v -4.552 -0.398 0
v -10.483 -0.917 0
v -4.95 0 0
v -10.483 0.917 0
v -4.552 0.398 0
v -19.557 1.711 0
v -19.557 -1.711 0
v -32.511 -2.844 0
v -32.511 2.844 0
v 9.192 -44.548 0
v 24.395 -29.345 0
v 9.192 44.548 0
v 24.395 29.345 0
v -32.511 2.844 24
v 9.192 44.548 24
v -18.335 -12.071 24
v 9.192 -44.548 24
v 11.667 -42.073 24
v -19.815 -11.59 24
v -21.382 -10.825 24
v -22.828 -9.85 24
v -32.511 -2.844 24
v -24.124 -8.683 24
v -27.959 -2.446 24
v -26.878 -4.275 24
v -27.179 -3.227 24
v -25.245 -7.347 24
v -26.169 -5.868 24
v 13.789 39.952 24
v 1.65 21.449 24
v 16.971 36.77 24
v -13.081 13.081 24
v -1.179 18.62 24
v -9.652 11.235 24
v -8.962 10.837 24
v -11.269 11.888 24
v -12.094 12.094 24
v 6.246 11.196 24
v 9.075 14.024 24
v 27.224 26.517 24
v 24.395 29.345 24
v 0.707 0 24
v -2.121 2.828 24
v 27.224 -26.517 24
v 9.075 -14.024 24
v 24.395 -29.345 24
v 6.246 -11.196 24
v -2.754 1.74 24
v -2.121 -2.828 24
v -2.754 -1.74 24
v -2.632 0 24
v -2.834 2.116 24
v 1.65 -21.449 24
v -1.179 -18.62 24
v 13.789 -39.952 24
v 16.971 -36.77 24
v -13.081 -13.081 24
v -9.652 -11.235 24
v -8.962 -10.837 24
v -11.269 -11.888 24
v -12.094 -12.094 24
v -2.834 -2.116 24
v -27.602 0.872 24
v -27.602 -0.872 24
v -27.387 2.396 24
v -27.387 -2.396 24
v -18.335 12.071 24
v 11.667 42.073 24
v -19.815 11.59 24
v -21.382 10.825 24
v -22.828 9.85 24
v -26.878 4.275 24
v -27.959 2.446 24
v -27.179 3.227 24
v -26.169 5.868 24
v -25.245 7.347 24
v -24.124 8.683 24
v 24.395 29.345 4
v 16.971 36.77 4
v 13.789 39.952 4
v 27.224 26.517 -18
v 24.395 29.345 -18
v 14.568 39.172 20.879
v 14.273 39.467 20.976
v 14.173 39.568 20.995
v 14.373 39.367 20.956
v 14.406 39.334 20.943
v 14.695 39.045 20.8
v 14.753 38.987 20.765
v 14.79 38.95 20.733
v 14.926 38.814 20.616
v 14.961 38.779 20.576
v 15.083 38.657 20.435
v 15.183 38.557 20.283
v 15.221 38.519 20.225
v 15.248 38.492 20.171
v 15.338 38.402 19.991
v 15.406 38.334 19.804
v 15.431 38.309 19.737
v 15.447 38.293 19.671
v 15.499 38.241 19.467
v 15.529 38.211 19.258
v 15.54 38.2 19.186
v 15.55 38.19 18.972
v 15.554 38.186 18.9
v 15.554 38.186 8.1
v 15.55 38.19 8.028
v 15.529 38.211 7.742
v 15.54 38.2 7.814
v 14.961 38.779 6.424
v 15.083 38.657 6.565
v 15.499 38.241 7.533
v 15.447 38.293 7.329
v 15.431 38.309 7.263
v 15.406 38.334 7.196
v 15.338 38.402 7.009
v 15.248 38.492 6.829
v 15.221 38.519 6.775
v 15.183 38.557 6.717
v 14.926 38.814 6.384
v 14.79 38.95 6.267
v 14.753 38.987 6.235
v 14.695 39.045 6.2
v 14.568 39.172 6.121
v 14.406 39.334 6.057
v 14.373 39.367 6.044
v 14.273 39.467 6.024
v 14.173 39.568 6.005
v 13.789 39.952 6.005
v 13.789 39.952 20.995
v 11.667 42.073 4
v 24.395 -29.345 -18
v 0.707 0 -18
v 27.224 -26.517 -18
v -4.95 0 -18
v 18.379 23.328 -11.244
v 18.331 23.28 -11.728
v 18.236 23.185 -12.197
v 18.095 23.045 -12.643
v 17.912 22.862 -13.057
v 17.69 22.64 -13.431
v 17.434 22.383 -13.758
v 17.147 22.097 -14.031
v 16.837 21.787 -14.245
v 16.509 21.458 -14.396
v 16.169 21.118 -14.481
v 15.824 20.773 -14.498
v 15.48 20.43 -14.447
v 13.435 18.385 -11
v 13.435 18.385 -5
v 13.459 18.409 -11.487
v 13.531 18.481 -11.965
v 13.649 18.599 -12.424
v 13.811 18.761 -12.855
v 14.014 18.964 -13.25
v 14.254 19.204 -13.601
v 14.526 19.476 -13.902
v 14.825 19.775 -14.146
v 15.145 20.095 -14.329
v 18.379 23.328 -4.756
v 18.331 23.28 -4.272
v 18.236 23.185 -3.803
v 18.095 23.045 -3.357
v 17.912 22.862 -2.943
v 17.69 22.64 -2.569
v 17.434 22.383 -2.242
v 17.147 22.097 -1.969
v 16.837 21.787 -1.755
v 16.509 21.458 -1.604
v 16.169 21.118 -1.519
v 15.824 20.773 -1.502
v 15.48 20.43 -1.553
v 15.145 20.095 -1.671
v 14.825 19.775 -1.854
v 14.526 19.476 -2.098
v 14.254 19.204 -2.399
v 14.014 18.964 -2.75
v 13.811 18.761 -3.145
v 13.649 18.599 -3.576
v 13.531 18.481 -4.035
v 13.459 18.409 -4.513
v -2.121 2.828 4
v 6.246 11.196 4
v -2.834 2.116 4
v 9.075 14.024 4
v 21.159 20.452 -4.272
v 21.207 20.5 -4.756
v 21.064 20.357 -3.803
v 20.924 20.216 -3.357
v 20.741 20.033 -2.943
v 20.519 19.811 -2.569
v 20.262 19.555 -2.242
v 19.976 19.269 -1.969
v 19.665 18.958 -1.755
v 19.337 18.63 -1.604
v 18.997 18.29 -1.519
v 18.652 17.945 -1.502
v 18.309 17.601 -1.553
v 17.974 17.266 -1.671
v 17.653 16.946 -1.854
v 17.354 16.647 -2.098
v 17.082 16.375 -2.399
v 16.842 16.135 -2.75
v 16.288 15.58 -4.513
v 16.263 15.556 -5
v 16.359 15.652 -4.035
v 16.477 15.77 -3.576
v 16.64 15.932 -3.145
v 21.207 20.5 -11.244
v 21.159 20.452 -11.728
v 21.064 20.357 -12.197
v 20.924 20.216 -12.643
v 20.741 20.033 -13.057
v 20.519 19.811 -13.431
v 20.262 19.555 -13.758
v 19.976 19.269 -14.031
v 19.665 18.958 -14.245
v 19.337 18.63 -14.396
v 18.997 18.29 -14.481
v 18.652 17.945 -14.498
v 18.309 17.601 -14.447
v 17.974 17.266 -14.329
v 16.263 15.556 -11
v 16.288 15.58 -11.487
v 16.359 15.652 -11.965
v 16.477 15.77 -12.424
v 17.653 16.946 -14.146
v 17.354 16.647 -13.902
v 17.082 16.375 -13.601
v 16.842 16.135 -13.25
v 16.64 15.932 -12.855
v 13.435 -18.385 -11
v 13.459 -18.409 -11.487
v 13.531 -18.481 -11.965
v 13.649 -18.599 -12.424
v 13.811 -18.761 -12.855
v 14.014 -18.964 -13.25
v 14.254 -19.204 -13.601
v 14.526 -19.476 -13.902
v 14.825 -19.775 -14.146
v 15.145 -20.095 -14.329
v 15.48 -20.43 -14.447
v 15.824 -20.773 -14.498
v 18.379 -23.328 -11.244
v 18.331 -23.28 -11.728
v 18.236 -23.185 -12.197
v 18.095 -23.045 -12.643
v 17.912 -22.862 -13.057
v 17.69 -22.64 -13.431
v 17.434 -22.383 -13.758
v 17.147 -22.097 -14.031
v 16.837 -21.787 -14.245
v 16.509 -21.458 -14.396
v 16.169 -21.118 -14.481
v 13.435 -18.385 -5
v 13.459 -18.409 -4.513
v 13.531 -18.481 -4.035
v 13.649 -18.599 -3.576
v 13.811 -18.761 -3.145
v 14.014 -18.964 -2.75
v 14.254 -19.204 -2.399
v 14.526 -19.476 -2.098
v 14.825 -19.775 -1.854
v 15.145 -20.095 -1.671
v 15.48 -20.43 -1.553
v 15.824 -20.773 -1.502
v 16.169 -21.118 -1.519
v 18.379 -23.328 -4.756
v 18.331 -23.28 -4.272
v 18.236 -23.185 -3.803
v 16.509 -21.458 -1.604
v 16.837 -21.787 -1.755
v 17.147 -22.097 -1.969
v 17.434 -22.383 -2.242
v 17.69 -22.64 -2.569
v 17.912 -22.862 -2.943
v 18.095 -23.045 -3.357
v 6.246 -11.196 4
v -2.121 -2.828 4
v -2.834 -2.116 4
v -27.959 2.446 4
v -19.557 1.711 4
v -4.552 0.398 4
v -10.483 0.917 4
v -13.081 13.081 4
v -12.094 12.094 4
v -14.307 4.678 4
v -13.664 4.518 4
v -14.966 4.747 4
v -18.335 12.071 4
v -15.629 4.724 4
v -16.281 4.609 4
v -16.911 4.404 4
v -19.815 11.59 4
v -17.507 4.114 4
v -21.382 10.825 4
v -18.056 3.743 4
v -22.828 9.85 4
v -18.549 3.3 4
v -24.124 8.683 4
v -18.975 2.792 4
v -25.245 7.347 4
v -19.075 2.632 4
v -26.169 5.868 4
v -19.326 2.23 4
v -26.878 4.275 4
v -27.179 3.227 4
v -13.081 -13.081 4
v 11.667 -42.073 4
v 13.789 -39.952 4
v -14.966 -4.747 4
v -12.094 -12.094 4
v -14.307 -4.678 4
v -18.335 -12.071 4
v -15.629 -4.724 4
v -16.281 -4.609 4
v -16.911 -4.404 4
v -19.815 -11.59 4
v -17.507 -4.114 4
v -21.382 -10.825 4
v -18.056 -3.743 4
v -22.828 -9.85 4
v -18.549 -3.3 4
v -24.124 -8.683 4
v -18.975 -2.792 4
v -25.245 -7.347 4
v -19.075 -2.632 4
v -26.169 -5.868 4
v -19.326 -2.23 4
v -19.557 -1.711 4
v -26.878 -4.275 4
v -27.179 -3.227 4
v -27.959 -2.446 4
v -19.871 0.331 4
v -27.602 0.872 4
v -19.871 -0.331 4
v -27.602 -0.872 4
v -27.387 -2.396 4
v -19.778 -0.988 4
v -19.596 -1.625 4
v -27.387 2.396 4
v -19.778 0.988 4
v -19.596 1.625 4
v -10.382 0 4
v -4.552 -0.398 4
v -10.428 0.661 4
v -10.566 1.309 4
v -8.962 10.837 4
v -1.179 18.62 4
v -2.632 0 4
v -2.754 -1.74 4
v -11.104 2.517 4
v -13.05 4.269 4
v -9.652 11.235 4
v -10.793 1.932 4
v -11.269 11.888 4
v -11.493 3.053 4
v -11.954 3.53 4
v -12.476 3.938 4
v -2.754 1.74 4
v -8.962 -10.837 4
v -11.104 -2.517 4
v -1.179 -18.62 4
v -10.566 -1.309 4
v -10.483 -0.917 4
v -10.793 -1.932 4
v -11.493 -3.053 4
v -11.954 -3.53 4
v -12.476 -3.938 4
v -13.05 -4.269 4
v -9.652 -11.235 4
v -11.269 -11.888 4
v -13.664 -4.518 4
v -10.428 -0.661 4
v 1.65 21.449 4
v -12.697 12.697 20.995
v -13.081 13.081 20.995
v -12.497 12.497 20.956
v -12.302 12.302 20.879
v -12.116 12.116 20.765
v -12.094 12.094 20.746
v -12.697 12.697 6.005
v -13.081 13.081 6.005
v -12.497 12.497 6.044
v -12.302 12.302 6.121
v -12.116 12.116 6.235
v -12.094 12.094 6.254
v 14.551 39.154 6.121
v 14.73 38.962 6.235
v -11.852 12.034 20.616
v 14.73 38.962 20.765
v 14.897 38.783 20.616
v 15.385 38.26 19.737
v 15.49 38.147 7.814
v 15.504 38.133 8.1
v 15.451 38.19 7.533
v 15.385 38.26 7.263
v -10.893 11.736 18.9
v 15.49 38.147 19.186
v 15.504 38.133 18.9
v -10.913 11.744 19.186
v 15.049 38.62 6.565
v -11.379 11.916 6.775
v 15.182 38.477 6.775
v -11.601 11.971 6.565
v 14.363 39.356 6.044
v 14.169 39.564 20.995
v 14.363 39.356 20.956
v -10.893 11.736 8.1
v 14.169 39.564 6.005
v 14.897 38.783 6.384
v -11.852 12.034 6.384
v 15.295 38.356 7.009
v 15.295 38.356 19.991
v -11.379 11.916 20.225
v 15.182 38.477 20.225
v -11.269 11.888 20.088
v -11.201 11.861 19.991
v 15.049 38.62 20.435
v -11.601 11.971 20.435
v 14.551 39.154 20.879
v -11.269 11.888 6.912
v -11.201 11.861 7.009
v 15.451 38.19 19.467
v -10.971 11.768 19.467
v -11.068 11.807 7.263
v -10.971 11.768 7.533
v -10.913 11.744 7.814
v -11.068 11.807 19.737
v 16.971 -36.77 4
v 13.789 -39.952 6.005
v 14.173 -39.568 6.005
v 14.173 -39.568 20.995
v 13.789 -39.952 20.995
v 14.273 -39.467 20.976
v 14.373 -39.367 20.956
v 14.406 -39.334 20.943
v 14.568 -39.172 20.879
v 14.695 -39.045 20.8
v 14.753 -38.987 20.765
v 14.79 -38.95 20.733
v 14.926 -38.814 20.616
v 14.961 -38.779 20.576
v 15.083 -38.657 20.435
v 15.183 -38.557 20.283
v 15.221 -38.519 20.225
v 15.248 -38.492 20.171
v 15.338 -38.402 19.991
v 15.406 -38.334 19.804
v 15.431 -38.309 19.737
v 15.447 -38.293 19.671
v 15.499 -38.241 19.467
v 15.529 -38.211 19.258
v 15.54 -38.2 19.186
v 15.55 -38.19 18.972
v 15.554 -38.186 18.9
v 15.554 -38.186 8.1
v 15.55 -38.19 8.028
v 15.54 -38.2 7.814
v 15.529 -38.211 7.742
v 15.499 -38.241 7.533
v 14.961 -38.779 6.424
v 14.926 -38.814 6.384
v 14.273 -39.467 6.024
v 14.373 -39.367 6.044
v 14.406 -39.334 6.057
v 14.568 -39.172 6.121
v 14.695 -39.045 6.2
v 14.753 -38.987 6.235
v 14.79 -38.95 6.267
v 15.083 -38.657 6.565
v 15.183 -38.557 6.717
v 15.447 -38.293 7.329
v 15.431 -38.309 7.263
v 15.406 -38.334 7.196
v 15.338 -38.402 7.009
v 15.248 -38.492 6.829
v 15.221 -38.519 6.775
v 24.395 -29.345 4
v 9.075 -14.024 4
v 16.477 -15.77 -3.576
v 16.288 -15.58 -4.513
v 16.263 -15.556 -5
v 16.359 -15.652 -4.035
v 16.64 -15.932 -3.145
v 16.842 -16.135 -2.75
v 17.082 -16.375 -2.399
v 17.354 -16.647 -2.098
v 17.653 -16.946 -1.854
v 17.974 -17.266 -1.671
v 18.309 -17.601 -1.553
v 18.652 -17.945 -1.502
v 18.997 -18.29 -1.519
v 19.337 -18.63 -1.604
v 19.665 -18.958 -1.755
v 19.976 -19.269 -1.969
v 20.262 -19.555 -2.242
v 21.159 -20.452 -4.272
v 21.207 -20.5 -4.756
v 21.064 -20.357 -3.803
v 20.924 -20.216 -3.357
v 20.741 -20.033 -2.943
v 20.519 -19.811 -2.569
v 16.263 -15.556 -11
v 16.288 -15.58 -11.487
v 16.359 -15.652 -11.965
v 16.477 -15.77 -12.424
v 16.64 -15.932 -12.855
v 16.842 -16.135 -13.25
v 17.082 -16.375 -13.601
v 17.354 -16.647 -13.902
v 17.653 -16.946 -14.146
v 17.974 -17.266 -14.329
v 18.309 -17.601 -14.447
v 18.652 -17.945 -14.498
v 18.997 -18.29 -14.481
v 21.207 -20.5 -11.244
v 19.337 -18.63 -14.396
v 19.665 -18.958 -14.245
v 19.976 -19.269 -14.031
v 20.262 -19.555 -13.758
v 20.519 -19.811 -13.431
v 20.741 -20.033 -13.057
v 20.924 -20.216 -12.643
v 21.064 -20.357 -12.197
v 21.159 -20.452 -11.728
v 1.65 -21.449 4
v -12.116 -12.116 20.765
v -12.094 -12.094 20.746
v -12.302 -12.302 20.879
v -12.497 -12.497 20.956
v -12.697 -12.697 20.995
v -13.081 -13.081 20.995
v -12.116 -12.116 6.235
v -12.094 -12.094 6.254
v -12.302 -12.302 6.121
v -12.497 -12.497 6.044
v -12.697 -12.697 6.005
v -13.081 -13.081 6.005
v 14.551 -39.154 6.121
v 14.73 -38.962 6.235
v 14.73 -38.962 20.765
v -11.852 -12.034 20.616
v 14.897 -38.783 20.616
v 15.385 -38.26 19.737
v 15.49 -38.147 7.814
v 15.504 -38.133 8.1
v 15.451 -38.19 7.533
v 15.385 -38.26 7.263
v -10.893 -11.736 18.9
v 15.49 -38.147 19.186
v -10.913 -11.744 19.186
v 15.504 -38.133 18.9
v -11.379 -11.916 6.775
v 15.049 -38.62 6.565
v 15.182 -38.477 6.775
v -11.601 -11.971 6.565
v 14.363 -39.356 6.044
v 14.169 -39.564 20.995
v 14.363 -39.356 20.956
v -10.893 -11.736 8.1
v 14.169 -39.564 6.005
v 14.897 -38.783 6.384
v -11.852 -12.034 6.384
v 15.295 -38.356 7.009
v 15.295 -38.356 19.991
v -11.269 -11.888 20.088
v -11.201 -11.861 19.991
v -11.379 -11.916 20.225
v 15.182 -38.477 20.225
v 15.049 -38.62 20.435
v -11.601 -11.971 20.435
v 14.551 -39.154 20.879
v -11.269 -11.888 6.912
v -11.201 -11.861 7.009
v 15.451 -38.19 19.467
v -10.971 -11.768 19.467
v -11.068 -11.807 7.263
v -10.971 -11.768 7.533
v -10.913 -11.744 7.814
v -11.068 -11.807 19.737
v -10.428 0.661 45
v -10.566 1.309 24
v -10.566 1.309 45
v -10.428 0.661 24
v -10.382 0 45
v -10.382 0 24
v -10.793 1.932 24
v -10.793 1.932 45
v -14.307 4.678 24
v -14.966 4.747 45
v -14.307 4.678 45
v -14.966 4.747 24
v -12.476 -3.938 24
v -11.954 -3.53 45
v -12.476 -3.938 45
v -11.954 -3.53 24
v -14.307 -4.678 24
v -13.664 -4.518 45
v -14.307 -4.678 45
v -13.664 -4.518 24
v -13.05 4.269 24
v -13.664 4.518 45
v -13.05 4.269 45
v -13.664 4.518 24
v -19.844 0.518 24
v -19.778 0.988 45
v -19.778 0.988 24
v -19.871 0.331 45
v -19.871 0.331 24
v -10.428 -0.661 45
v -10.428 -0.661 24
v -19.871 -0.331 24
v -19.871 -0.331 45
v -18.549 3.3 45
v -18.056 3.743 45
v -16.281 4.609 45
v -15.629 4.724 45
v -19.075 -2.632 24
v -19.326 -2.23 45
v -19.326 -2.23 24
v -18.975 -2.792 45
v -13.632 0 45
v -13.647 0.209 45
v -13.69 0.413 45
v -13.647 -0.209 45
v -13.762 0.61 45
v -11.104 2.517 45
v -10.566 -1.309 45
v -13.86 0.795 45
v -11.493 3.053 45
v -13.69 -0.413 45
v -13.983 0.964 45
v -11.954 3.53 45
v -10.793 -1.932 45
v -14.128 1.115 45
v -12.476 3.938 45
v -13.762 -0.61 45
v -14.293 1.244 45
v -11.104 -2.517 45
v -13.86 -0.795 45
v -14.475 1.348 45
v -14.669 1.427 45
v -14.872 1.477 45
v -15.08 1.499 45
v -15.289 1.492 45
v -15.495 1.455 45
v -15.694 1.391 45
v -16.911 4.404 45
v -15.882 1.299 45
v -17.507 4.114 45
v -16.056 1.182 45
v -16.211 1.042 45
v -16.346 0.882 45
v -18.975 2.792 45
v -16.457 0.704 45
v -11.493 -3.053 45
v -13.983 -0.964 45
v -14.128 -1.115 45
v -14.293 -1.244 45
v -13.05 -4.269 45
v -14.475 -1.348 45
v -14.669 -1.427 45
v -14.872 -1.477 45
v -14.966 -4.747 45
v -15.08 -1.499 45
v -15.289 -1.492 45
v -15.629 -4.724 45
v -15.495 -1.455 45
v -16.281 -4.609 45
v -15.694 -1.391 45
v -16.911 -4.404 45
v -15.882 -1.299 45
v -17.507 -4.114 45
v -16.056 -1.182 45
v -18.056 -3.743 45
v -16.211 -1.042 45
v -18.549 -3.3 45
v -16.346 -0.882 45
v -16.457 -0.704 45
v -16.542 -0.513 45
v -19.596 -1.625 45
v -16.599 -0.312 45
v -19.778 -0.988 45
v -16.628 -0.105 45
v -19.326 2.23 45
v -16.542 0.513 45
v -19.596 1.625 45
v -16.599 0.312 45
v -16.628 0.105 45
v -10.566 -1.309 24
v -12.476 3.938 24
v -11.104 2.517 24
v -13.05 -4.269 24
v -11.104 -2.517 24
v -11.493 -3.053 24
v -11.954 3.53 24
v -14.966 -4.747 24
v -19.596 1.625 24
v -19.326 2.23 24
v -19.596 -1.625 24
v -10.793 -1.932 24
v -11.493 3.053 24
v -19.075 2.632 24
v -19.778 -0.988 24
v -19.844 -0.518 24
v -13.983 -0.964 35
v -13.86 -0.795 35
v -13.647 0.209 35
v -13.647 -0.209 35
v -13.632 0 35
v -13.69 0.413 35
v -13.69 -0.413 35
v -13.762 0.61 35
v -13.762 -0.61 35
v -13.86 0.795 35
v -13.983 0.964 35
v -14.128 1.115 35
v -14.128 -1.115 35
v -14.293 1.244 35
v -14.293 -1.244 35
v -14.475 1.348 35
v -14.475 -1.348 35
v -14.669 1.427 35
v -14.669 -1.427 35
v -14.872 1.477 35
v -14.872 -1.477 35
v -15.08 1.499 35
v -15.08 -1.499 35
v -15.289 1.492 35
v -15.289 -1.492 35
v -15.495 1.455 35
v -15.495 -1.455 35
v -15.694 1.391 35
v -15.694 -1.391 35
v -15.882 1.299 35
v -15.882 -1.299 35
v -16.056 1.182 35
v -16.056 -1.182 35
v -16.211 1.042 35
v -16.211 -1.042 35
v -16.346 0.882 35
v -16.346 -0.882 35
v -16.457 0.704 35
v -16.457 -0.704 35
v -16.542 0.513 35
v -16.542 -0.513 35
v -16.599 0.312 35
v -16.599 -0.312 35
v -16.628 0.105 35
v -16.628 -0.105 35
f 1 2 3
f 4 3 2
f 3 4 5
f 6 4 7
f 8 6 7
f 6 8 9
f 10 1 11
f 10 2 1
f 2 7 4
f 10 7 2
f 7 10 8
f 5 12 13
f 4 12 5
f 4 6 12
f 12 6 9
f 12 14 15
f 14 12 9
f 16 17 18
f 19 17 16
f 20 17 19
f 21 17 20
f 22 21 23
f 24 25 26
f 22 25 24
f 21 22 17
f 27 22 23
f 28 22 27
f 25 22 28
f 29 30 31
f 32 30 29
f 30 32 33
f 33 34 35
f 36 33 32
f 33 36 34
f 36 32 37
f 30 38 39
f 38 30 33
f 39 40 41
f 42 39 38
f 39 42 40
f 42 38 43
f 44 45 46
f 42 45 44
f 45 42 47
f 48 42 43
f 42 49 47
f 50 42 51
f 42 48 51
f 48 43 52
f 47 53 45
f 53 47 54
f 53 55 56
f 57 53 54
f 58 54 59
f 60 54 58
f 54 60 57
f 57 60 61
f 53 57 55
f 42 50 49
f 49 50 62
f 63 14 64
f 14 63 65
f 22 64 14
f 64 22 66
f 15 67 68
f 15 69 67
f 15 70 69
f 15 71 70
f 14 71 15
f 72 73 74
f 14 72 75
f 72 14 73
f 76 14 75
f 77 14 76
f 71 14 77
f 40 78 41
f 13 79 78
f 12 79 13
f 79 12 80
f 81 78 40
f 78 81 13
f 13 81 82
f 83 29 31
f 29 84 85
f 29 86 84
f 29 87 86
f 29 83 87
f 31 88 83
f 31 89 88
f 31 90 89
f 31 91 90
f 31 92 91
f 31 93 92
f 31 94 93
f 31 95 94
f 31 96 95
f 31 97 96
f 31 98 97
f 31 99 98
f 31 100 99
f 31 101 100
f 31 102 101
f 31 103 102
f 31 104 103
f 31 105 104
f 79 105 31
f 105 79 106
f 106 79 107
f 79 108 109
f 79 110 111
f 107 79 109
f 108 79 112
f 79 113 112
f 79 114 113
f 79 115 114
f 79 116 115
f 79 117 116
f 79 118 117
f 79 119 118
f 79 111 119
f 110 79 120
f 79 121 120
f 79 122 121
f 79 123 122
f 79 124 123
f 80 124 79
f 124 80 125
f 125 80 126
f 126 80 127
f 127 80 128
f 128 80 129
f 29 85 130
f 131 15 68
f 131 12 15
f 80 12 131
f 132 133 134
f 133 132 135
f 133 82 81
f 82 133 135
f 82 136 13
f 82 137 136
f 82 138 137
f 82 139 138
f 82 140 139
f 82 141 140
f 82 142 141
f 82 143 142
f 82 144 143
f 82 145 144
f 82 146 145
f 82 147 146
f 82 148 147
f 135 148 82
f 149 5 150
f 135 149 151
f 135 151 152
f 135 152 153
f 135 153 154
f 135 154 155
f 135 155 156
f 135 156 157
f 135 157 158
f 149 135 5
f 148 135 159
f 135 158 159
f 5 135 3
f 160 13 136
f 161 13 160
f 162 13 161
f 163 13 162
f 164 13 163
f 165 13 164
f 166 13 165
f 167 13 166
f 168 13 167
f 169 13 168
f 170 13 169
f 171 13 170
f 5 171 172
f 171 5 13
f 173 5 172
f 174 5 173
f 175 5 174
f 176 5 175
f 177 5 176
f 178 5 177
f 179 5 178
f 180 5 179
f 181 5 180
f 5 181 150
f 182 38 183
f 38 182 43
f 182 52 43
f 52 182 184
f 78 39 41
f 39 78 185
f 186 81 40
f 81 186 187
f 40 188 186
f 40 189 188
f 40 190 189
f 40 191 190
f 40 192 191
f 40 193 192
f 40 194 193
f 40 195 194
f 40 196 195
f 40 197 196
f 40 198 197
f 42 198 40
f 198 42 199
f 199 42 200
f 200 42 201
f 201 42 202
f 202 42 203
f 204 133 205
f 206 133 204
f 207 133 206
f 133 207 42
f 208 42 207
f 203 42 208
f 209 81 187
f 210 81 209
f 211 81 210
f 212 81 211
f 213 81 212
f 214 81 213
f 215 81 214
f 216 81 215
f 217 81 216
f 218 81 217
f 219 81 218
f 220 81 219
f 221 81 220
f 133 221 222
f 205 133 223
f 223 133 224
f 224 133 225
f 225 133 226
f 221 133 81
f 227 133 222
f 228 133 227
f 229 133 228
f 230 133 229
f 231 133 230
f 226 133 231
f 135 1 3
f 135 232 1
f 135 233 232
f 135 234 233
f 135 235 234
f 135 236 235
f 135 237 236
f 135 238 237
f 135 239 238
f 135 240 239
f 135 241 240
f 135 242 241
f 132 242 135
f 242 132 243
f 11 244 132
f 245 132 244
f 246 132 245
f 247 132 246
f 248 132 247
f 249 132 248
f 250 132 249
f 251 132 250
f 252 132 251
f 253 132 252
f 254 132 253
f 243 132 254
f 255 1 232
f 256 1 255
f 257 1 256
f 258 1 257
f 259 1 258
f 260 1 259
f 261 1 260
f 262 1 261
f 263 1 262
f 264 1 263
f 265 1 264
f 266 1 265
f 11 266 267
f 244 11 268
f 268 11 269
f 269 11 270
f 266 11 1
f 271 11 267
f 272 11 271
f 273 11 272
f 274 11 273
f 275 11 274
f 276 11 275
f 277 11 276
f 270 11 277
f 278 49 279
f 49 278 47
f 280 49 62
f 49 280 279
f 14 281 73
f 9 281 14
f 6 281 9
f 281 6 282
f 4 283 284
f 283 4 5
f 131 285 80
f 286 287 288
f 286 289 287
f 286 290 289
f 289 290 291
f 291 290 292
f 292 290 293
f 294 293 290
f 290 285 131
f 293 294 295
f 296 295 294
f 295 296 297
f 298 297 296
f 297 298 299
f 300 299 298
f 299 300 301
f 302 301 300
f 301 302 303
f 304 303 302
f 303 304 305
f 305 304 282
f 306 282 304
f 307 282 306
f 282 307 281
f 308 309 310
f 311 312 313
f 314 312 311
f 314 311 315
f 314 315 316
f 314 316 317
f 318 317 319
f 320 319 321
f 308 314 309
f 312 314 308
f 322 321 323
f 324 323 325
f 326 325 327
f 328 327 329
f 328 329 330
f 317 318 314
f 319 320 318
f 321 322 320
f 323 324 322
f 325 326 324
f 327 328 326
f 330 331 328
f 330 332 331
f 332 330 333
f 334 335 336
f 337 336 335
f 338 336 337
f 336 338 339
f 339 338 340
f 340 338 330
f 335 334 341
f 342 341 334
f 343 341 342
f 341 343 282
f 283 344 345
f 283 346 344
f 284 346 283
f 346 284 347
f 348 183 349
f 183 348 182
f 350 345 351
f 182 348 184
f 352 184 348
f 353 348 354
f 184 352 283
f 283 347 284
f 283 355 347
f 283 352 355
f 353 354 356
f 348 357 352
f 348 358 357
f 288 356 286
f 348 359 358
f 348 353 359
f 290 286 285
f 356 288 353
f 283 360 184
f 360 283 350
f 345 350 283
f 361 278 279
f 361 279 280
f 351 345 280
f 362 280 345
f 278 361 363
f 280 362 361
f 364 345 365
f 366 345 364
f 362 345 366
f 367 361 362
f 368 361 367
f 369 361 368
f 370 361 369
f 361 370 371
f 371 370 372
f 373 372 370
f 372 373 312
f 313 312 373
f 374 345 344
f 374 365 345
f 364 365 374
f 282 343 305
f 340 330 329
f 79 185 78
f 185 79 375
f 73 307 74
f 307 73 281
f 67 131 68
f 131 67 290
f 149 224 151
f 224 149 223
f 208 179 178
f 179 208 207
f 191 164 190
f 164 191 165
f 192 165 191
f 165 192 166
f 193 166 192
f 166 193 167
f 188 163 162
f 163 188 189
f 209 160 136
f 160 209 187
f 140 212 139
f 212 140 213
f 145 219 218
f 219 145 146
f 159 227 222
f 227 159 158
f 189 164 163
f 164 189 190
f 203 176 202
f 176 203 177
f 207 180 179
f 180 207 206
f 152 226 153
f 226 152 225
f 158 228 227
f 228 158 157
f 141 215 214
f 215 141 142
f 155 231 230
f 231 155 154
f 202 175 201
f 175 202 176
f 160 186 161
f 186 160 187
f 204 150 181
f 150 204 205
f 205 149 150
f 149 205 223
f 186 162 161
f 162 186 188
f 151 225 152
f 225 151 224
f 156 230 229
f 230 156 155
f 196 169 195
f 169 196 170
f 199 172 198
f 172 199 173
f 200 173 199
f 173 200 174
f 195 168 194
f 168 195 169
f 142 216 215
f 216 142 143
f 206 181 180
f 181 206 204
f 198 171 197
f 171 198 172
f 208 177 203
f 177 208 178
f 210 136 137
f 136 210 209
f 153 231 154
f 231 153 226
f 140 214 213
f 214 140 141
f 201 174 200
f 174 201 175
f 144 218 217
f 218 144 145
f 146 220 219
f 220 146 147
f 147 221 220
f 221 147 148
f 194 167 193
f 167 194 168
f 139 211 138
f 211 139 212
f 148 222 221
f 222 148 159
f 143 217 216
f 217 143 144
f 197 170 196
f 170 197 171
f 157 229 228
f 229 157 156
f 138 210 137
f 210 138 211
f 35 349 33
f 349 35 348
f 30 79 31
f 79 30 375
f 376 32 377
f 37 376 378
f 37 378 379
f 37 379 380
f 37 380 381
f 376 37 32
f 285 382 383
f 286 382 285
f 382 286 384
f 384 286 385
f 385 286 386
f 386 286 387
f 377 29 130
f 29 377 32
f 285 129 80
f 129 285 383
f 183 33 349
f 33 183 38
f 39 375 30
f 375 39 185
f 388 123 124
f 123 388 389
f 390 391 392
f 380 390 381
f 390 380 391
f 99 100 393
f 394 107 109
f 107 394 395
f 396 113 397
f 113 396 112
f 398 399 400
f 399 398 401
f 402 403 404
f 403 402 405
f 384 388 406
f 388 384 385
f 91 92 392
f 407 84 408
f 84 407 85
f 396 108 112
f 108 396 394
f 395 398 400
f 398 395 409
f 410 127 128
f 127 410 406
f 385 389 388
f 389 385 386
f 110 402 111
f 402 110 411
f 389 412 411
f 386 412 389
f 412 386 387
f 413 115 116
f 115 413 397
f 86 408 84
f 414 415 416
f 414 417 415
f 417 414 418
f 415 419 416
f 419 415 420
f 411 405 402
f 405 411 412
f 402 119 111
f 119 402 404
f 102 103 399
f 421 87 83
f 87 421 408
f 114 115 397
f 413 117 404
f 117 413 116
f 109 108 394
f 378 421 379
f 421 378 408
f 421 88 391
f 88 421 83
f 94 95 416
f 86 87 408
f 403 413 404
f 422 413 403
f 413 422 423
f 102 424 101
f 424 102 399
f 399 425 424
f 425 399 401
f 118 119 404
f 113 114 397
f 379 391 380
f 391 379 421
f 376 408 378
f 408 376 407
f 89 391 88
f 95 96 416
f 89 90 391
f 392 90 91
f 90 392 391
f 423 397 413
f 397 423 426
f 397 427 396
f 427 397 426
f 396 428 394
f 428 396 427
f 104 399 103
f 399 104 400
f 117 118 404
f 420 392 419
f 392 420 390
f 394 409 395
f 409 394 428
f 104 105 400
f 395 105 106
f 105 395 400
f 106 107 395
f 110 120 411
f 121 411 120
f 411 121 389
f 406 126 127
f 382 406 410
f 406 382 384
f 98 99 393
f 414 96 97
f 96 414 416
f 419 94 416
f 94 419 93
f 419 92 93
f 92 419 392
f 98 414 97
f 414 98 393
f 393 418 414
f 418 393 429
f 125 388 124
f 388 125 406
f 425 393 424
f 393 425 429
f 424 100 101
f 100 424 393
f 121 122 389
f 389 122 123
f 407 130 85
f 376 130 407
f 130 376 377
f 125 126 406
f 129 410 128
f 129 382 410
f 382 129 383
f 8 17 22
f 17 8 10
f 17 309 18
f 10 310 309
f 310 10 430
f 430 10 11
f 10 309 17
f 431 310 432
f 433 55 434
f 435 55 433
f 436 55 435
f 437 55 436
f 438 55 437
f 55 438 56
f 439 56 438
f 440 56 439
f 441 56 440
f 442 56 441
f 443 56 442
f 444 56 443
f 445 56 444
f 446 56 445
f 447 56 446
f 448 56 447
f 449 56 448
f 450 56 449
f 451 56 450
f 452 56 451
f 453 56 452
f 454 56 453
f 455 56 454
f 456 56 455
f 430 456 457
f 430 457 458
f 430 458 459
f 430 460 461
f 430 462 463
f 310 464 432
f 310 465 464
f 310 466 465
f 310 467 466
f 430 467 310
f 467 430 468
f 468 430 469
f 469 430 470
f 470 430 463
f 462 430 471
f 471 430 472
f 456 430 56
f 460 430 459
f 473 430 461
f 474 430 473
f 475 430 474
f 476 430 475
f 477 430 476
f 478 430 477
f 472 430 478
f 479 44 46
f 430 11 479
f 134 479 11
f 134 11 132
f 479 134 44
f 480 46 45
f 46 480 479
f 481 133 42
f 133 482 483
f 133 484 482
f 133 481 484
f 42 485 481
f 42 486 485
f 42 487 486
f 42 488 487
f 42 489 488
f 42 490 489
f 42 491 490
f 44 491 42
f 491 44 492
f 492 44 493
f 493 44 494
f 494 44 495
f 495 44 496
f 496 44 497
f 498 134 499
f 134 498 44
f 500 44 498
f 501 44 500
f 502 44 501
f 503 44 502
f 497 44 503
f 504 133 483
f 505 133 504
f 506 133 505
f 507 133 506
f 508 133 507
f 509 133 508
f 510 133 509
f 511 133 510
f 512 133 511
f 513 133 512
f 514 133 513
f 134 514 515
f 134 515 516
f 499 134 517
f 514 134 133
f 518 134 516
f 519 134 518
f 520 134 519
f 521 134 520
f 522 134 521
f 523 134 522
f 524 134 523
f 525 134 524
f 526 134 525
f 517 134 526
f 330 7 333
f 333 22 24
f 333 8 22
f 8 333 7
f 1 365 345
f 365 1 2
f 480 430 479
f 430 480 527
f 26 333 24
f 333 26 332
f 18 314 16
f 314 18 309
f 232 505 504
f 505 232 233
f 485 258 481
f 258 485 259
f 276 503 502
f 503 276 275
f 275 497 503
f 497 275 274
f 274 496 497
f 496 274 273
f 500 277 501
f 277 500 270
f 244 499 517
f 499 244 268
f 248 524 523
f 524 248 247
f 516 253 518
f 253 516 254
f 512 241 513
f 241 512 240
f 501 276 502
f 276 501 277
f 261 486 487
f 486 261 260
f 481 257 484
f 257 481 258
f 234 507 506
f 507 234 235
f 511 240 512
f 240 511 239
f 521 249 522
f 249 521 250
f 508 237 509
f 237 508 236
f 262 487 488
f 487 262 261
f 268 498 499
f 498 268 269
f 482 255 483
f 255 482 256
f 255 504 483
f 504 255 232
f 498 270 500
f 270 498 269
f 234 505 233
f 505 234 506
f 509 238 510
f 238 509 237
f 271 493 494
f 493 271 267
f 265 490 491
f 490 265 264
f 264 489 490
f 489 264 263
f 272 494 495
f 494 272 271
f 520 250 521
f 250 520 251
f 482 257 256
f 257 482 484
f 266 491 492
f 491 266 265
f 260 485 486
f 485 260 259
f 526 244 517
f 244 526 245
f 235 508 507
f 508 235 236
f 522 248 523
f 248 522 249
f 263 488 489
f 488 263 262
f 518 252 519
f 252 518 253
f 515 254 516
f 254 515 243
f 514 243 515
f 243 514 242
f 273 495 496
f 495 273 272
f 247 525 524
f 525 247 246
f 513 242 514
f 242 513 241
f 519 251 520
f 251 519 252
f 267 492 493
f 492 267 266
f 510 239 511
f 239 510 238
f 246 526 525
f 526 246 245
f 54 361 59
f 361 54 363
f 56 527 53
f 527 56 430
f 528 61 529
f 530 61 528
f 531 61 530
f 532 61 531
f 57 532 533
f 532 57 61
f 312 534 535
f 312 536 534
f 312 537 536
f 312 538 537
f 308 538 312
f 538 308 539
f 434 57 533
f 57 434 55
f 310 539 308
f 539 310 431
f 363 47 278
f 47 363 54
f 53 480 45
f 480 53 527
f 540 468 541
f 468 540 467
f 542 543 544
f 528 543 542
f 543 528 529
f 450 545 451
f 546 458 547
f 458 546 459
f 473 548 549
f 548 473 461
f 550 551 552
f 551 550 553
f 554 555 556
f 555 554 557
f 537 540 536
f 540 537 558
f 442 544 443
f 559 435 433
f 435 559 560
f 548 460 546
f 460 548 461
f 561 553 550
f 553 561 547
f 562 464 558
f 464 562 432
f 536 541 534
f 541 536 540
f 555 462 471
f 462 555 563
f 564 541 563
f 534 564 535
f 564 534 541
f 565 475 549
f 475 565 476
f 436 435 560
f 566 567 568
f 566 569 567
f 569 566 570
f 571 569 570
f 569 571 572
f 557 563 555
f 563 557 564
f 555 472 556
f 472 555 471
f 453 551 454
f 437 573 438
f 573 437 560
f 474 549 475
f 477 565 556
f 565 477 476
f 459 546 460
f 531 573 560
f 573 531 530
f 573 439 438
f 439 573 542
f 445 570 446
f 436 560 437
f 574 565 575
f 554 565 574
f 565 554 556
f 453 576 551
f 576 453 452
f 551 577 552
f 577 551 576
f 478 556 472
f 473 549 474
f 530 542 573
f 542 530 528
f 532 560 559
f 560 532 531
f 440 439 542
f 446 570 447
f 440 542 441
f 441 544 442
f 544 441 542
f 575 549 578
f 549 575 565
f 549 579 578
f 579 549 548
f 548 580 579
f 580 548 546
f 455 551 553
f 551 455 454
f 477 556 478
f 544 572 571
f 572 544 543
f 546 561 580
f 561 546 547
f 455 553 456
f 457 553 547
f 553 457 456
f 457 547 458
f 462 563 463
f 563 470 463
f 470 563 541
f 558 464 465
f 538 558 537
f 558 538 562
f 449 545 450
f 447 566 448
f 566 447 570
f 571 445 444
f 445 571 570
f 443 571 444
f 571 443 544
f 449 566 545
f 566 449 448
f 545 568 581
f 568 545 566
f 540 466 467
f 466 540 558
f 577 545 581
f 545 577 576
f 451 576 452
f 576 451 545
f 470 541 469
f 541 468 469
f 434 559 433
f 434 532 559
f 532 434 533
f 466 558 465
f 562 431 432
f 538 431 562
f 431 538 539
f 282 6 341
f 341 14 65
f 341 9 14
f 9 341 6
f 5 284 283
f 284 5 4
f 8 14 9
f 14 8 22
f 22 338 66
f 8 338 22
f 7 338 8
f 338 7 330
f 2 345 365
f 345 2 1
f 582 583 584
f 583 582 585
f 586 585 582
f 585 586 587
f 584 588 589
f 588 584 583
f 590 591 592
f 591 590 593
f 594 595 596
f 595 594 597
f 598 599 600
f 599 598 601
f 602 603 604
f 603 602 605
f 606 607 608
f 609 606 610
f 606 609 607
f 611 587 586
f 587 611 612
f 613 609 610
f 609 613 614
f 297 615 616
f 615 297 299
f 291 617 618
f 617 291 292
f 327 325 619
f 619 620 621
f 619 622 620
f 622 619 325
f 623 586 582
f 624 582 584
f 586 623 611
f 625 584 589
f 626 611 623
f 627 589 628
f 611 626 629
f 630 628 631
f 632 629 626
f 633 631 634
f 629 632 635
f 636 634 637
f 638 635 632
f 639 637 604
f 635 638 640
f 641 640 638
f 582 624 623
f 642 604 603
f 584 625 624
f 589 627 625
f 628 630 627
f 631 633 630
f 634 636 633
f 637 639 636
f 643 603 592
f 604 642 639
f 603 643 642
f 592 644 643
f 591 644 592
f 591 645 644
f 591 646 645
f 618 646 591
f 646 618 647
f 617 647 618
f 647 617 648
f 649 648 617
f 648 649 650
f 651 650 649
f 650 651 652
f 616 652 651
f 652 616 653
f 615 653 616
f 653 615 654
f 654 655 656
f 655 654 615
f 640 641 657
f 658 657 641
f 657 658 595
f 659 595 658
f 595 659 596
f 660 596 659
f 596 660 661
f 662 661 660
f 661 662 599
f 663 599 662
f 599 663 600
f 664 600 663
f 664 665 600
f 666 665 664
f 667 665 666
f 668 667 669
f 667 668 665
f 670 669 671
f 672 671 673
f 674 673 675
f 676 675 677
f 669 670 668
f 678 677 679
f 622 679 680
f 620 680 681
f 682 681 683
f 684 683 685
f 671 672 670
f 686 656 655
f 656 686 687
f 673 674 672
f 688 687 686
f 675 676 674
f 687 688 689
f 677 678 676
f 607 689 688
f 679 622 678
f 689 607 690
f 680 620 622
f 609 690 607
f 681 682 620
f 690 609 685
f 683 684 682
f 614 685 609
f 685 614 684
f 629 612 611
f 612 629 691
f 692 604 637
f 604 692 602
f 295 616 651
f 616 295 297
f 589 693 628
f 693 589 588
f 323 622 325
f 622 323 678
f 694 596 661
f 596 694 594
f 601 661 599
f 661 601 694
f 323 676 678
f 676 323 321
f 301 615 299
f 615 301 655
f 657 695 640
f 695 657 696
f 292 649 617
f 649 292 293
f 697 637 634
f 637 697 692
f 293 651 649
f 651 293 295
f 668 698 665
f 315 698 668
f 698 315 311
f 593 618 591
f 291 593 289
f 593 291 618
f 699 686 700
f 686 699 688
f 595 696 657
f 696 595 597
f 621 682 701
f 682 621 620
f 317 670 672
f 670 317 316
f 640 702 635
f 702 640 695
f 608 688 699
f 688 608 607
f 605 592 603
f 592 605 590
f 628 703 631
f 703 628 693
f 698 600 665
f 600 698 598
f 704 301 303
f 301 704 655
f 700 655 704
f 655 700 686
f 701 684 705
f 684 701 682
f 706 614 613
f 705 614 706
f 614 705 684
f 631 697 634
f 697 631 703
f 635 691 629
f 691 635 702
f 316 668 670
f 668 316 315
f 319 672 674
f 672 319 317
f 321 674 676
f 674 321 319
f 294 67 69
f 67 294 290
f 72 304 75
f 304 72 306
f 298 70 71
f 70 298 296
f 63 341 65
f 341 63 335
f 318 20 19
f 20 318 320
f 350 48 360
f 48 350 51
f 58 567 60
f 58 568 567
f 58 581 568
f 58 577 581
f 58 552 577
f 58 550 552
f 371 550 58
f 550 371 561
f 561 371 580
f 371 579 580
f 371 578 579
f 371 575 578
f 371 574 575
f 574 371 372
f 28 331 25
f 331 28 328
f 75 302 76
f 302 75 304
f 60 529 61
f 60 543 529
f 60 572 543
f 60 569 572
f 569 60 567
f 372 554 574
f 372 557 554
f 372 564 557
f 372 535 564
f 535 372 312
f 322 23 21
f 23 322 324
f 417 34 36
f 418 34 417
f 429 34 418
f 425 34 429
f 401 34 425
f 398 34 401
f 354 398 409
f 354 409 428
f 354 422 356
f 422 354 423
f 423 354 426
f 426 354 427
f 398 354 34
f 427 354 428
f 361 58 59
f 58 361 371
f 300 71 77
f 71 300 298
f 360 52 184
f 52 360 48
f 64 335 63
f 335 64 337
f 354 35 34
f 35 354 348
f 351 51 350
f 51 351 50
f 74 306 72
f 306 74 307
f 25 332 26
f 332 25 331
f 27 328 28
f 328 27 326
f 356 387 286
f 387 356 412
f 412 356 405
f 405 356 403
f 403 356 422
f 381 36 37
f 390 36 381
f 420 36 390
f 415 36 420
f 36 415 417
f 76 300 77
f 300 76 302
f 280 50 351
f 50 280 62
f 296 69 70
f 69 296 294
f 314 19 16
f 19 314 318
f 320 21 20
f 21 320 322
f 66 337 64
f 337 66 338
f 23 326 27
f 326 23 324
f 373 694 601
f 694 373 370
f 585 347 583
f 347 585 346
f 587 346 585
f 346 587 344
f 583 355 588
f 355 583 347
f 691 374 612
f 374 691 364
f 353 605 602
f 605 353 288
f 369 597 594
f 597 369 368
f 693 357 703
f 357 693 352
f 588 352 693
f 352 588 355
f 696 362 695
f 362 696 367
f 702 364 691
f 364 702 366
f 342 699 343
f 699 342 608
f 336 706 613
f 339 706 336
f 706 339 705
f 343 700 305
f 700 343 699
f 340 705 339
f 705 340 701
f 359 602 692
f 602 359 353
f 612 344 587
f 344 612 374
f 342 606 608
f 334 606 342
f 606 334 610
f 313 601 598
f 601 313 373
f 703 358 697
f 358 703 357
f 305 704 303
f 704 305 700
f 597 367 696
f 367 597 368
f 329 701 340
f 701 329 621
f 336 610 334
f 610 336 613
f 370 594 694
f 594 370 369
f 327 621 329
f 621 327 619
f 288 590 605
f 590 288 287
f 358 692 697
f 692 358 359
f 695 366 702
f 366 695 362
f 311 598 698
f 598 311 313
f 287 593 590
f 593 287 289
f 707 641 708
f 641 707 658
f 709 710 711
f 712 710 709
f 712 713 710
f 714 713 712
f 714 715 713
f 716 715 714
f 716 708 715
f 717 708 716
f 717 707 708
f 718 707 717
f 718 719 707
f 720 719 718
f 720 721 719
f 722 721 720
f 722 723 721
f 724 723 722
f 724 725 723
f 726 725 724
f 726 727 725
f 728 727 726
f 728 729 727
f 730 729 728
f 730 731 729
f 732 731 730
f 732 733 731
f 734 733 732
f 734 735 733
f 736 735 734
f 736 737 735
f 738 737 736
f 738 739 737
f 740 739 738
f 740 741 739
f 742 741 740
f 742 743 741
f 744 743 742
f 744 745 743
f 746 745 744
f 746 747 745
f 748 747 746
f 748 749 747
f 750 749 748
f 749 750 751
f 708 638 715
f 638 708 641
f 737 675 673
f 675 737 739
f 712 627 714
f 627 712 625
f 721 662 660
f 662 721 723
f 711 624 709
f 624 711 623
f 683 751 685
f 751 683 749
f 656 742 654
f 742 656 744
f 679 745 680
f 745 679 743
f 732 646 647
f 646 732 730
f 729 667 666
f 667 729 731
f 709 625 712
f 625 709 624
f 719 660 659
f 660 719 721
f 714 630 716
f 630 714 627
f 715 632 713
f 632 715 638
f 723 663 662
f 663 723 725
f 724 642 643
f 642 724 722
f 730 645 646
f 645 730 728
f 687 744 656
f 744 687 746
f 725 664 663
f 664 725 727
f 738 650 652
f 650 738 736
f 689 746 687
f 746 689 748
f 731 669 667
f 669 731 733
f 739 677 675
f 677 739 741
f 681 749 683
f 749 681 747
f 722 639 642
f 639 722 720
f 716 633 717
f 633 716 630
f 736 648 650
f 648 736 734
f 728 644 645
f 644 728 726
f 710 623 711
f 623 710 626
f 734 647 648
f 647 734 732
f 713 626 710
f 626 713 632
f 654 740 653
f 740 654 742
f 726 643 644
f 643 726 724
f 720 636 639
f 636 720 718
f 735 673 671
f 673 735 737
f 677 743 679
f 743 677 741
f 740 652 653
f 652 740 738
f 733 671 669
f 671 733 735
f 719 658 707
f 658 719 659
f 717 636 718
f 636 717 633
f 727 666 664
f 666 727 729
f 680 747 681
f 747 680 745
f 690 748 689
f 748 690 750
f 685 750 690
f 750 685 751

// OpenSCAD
$fn = 45;
d_stick = 9.5;
d_cut_stick = 3;
d_wheel = 17;

length_stick = 45;
length_cut_stick = 10;

size_extern = [25, 38, 24];
size_intern = [18, 65, 20];

//alpha = 60.886266849;
//alpha = 180-153;
alpha = 90;
beta = 40;
s=alpha-2*beta;

coral_d = 4.2;
coral_width = 15;
coral_pos = -3;

pos_hole = (size_intern.x-d_wheel/2+1.2)/sin(alpha/2);

module small_box() {
    linear_extrude(size_extern.z)
    square([size_extern.x, size_extern.y]);
    translate([
        size_extern.x-(size_extern.x-size_intern.x)/2,
        -3.5,
        +size_extern.z-42
    ])
    linear_extrude(42)
    square([size_extern.z-size_intern.z, size_extern.y+3.5]);
}

module small_cut_box() {
    linear_extrude(size_intern.z)
    square([size_intern.x, size_intern.y]);
}


module body() {
    translate(
        [
        -size_extern.x,
        0,
        0
        ]
    )
    small_box();
}

module cut_body() {
    translate(
        [
        -size_extern.x,
        0,
        0
        ]
    )
    translate(
        [
        (size_extern.x-size_intern.x)/2,
        -10,
        size_extern.z-size_intern.z
        ]
    )
    small_cut_box();
}

module cut_stick() {
    translate(
        [
        -pos_hole,
        0,
        length_stick-10
    ])
    cylinder(h=length_cut_stick, d=d_cut_stick);
}

module stick() {
    translate(
        [
        -pos_hole,
        0,
        0
        ]
    )
    cylinder(h=length_stick, d=d_stick);
}

module wheel() {
    translate(
        [
        -pos_hole,
        0,
        size_extern.z-size_intern.z
        ])
    difference() {
        cylinder(h=20, d=d_wheel+8);
        cylinder(h=length_stick, d=d_stick);
    }
}

module small_hole() {
    #rotate([90, 180, 90])
    hull() {
        translate([0, 22, 0])
        cylinder(h=8, d=7, center=true);
        translate([0, 16, 0])
        cylinder(h=8, d=7, center=true);
    }
}

module large_hole() {
    rotate([0, 90, 0])
    cylinder(h=8, d=6, center=true);
}


module arc() {
    difference() {
        union() {
            linear_extrude(height=size_extern.z)
            translate([size_intern.x-4, 0])
            square([4.5, size_extern.y]);
        
            linear_extrude(height=size_extern.z)
            translate([0, size_intern.y/3])
            square([size_intern.x, 4]);
        }
        
        translate(
            [
            18-2+coral_width-coral_d/2,
            0,
            9+coral_pos
            ]
        )
        rotate(
        [
        0,
        0,
        90
        ]
        )
        coral_cut();
    }
}

module fill_arc() {
    let(
        ex_x=size_extern.x/cos(beta),
        in_x=size_intern.x/cos(beta)
    ) {
        rotate(
            [
            0,
            0,
            180-(s/2)
            ]
        )
        rotate_extrude(angle=s)
        square([ex_x, size_extern.z]);
    }
}

module half_body() {
    rotate(
    [
        0,
        0,
        -alpha/2
    ]
    )
    difference() {
        union() {
            difference() {
                union() {
                    body();
                    linear_extrude(height=size_extern.z)
                    polygon(
                    [
                    [0, 0],
                    [-size_extern.x, 0],
                    [-size_extern.x, -size_extern.x*tan(beta)]
                    ]);
                };
                translate([0, -15, 0])
                cut_body();
            }
        }
        translate([0, size_extern.y-12, size_extern.z-size_intern.z+7])
        small_hole();
    }
    
    rotate(
    [
        0,
        0,
        -alpha/2
    ]
    )
    translate(
            [
            -size_extern.x,
            0,
            0
            ]
        )
    translate([size_extern.x, size_extern.y, 0])
    rotate([0, 0, 180])
    //scale([1,2,1])
    arc();
}



module arcf(radius, thick, angle){
	intersection(){
		union(){
			rights = floor(angle/90);
			remain = angle-rights*90;
			if(angle > 90){
				for(i = [0:rights-1]){
					rotate(i*90-(rights-1)*90/2){
						polygon([[0, 0], [radius+thick, (radius+thick)*tan(90/2)], [radius+thick, -(radius+thick)*tan(90/2)]]);
					}
				}
				rotate(-(rights)*90/2)
					polygon([[0, 0], [radius+thick, 0], [radius+thick, -(radius+thick)*tan(remain/2)]]);
				rotate((rights)*90/2)
					polygon([[0, 0], [radius+thick, (radius+thick)*tan(remain/2)], [radius+thick, 0]]);
			}else{
				polygon([[0, 0], [radius+thick, (radius+thick)*tan(angle/2)], [radius+thick, -(radius+thick)*tan(angle/2)]]);
			}
		}
		difference(){
			circle(radius+thick);
			circle(radius);
		}
	}
}


//Linear Extrude with Scale as an interpolated function
// This module does not need to be modified, 
// - unless default parameters want to be changed 
// - or additional parameters want to be forwarded (e.g. slices,...)
module linear_extrude_fs(height=1,isteps=20){
 //union of piecewise generated extrudes
 union(){ 
   for(i = [ 0: 1: isteps-1]){
     //each new piece needs to be adjusted for height
     translate([0,0,i*height/isteps])
      linear_extrude(
       height=height/isteps,
       scale=[1, f_lefs((i+1)/isteps)/f_lefs(i/isteps)
       ]
      )
       // if a twist constant is defined it is split into pieces
        // each new piece starts where the last ended
        scale(
        [
        1, f_lefs(i/isteps)
        ])
        arcf(0, size_extern.x, 90);
   }
 }
}
// This function defines the scale function
// - Function name must not be modified
// - Modify the contents/return value to define the function
function f_lefs(x) = 
 let(span=90,start=80,normpos=90)
 sin(x*span+start)/sin(normpos);


module coral_cut() {
    translate([0, 0, coral_d/2])
    
    minkowski() {
        linear_extrude(height=coral_width-coral_d)
        square([size_intern.y, coral_width - coral_d]);
        sphere(d=coral_d);
    }
}

difference() {
    union() {
        half_body();
        mirror([0, 1, 0])
        half_body();
        fill_arc();
        stick();
        // rotate([0, 0, 180])
        // linear_extrude_fs(height=10);
    };
    #wheel();
    cut_stick();
}
